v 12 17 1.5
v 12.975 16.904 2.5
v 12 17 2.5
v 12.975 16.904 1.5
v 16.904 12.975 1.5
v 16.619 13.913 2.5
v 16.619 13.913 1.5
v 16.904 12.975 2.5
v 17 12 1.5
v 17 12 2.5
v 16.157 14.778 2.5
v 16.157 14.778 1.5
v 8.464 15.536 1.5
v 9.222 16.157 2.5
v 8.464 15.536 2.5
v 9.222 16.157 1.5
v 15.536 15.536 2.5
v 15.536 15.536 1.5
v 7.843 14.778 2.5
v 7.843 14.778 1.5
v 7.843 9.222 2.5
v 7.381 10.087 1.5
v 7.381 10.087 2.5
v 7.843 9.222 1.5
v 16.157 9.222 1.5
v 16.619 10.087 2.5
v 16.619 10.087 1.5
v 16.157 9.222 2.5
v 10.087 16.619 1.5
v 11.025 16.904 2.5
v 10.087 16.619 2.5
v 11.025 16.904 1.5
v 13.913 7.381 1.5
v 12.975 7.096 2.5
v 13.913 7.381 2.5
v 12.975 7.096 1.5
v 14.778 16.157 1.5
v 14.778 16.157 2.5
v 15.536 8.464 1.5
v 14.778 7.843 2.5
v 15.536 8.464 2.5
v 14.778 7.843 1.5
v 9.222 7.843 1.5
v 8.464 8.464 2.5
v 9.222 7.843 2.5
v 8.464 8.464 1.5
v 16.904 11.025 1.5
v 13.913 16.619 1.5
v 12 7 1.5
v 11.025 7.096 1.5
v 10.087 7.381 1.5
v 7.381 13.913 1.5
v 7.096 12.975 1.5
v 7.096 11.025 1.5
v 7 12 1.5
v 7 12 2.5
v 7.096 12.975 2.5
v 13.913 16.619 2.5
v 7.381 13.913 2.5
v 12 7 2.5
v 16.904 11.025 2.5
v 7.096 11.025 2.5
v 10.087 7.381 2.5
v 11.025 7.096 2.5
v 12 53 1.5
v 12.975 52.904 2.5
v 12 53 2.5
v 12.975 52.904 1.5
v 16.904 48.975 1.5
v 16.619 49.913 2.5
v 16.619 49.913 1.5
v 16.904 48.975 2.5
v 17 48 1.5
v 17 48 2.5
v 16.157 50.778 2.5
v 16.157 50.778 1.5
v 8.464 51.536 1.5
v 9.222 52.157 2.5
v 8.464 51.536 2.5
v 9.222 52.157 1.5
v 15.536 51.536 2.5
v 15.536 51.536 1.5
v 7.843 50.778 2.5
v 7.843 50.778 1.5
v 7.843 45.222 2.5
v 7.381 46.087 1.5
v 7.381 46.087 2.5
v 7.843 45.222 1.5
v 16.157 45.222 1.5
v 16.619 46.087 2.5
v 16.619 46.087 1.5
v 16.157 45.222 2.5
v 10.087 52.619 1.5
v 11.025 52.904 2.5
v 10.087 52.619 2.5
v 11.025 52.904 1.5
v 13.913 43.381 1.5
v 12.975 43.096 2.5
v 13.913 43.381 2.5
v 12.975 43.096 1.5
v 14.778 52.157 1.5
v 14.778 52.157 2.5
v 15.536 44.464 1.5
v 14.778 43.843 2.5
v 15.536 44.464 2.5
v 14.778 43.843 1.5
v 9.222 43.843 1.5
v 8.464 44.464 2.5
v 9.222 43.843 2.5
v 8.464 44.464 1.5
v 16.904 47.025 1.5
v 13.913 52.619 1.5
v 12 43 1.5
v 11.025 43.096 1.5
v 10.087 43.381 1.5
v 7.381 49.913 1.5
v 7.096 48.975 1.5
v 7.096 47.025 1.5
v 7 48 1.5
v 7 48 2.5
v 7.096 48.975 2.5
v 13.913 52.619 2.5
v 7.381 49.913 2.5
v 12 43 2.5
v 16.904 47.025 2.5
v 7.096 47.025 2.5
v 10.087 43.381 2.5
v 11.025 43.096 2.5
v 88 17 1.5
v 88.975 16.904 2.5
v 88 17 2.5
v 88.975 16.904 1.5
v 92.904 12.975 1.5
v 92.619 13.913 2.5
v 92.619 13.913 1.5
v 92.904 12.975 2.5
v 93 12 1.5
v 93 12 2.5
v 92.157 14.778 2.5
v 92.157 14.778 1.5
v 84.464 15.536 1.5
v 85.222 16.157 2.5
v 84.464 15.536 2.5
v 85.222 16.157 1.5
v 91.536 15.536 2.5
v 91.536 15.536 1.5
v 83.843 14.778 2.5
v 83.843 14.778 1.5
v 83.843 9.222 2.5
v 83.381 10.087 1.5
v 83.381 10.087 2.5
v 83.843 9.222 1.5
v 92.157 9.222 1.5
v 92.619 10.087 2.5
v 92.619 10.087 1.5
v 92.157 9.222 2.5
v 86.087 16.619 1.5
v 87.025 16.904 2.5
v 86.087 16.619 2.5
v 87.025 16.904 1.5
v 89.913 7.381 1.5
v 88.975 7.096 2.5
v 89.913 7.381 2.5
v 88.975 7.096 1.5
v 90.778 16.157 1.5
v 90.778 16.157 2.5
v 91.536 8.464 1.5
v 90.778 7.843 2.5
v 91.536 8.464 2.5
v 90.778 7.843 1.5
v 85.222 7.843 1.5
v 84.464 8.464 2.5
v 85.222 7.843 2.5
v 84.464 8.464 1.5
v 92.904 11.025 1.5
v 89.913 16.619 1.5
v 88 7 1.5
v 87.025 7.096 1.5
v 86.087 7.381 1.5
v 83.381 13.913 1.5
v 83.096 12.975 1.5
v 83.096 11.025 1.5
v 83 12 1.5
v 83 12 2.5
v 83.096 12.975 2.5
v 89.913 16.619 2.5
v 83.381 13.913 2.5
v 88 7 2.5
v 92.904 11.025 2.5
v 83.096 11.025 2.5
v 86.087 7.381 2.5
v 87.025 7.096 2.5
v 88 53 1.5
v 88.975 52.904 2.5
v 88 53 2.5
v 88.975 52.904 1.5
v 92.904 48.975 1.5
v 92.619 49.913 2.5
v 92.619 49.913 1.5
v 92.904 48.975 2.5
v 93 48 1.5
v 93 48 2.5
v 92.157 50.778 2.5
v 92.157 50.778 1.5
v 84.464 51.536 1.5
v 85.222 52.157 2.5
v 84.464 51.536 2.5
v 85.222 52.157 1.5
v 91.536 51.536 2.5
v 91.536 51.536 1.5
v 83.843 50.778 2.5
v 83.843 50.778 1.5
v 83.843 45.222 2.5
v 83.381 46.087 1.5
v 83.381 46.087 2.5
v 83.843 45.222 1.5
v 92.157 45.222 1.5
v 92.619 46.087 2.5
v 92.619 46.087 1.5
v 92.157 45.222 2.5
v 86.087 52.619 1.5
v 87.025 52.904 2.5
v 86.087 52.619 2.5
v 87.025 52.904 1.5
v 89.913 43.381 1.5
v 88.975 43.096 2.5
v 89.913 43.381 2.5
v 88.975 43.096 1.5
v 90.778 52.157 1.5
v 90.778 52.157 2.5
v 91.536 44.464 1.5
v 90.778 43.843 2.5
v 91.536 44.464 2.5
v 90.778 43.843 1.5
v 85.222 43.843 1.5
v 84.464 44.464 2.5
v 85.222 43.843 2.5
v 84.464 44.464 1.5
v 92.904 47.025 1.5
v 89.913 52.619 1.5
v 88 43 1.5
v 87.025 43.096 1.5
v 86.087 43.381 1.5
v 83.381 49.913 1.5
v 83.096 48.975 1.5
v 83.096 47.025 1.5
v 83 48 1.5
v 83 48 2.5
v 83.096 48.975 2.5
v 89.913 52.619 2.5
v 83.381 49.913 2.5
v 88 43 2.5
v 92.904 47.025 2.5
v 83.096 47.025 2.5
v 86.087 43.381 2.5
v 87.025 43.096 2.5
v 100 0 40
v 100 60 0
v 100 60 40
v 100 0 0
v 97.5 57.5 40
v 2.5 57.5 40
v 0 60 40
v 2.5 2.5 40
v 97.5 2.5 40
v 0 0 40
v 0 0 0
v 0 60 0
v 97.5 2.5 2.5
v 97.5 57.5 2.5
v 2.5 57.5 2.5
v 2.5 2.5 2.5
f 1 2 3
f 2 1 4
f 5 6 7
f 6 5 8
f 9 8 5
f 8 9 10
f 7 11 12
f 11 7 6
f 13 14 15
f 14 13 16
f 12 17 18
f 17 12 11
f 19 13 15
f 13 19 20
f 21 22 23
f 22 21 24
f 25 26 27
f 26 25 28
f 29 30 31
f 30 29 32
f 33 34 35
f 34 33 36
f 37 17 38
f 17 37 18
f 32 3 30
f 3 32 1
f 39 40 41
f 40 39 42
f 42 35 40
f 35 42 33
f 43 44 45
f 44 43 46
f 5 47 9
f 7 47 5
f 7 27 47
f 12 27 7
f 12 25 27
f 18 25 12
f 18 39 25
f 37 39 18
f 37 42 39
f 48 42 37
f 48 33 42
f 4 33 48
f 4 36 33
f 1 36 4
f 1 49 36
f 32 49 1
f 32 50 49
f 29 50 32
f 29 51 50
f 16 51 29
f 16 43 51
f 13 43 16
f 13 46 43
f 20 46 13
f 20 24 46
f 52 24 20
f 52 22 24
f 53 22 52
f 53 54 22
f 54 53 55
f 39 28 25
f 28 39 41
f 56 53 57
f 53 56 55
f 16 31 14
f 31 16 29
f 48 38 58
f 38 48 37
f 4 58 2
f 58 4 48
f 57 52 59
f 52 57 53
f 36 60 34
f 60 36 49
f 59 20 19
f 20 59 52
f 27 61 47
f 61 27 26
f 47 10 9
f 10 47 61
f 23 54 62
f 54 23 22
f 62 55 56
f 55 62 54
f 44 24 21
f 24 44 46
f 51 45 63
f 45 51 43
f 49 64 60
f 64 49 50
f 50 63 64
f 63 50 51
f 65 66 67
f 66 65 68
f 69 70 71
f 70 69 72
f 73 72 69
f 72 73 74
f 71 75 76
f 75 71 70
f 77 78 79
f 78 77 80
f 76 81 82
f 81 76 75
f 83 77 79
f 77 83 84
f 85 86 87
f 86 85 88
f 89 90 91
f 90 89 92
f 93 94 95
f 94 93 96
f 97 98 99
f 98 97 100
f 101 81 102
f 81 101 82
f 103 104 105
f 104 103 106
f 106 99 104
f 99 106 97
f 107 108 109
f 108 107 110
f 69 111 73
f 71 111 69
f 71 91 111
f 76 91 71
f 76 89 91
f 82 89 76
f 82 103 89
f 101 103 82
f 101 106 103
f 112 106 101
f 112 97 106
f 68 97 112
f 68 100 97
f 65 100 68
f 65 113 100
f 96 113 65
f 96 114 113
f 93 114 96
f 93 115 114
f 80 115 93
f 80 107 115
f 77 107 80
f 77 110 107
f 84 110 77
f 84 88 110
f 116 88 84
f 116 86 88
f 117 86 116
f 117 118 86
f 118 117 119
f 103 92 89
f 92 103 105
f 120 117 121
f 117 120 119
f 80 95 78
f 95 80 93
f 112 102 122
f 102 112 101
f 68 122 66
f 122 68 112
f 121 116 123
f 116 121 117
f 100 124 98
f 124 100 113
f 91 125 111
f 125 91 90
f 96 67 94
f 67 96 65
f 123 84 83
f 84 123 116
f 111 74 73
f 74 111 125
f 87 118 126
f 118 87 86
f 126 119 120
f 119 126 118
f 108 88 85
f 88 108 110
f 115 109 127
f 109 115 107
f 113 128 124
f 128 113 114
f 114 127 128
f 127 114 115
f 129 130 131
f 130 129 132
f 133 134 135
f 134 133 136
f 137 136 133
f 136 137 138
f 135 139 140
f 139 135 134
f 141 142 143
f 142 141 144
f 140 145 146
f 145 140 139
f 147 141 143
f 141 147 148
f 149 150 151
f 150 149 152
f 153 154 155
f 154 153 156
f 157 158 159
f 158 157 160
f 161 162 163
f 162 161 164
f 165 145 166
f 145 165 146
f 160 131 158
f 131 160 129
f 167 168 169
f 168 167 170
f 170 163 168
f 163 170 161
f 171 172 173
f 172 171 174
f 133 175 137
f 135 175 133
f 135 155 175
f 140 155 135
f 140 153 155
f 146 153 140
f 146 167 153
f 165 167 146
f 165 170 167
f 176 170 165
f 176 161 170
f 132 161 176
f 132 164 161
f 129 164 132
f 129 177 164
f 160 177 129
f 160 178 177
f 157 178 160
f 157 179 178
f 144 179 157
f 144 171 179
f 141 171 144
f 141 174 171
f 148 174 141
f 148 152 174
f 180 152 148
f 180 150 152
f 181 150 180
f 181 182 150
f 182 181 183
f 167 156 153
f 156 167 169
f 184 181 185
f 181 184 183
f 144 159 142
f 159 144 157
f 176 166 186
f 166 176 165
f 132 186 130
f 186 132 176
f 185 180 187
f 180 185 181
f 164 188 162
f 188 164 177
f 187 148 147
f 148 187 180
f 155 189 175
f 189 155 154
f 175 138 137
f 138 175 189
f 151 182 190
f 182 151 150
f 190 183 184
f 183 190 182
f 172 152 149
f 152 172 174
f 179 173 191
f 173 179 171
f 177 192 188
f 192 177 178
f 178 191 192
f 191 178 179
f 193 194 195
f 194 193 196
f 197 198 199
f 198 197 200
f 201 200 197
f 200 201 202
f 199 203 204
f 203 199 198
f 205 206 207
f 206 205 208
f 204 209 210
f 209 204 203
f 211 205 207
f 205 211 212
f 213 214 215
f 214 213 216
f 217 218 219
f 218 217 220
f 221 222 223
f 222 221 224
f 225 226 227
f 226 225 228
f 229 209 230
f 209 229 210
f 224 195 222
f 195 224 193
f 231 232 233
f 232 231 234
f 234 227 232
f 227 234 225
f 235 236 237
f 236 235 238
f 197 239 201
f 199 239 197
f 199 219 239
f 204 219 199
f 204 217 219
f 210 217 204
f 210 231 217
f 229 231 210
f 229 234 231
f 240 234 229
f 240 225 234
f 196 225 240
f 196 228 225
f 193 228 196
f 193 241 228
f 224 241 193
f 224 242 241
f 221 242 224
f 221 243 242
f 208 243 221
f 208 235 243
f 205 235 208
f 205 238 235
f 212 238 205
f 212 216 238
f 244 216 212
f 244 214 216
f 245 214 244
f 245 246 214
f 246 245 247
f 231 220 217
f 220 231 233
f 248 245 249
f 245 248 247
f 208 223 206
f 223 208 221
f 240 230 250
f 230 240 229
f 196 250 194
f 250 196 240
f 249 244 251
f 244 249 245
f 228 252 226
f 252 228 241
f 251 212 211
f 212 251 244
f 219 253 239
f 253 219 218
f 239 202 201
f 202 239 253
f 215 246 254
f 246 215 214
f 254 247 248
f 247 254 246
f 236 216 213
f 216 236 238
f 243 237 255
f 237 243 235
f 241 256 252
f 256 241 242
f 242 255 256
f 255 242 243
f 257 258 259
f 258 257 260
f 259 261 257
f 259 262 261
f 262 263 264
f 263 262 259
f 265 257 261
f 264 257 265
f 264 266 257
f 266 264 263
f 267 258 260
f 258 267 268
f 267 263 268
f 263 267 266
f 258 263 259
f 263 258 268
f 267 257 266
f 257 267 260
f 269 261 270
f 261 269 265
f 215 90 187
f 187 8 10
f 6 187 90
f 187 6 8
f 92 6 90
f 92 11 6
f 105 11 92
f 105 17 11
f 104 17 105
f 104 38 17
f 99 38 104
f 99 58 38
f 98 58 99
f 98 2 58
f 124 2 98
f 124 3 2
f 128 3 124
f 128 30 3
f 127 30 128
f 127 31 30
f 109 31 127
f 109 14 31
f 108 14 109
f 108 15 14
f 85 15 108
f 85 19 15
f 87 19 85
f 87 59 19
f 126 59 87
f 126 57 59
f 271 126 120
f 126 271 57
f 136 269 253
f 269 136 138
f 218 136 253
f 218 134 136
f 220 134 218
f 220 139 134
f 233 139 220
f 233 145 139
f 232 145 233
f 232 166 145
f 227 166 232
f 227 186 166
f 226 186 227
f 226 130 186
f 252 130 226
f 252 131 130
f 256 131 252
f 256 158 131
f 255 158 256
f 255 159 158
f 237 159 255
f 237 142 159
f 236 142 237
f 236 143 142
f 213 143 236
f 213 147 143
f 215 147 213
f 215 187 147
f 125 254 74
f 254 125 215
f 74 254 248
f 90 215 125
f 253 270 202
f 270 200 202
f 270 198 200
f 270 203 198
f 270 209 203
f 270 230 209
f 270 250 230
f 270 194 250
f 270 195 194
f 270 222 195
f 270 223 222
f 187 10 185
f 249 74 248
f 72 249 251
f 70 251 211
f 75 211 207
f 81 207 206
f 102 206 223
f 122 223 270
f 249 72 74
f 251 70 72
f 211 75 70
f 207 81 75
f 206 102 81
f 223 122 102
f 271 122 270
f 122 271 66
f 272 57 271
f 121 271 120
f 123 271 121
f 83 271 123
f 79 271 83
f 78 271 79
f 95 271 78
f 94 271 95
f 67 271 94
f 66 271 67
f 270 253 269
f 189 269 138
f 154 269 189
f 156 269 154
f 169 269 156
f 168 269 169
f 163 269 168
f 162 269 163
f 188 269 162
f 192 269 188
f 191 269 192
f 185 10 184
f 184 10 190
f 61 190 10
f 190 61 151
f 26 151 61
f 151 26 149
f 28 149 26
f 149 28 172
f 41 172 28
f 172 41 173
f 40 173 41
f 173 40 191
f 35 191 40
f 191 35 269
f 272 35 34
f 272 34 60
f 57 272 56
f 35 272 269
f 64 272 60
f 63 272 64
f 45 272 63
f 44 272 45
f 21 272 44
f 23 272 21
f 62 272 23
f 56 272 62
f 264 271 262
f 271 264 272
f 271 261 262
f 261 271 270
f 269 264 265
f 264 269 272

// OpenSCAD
$fn = 32;

// ----------------------------------------------------------------------
// Enclosure box: bosses enclosure
// ----------------------------------------------------------------------

// --- parameters (mm) ---
box_l = 100;              // outer length, X
box_w = 60;               // outer width, Y
box_h = 40;               // outer height
wall_t = 2.5;             // wall thickness
boss_r = 5;               // corner boss radius
hole_r = 2;               // boss screw hole radius
boss_in = 12;             // boss inset from the corners

inner_h = box_h - wall_t;  // cavity depth
boss_h = inner_h - 2;  // corner boss height

difference() {
  cube([box_l, box_w, box_h]);
  translate([wall_t, wall_t, wall_t])
    cube([box_l - 2 * wall_t, box_w - 2 * wall_t, box_h]);
  for (sx = [0, 1], sy = [0, 1])
    translate([sx ? box_l - boss_in : boss_in,
               sy ? box_w - boss_in : boss_in, wall_t - 1]) {
      cylinder(r = boss_r, h = boss_h);
      translate([0, 0, boss_h - 4])
        cylinder(r = hole_r, h = 5);
    }
}
